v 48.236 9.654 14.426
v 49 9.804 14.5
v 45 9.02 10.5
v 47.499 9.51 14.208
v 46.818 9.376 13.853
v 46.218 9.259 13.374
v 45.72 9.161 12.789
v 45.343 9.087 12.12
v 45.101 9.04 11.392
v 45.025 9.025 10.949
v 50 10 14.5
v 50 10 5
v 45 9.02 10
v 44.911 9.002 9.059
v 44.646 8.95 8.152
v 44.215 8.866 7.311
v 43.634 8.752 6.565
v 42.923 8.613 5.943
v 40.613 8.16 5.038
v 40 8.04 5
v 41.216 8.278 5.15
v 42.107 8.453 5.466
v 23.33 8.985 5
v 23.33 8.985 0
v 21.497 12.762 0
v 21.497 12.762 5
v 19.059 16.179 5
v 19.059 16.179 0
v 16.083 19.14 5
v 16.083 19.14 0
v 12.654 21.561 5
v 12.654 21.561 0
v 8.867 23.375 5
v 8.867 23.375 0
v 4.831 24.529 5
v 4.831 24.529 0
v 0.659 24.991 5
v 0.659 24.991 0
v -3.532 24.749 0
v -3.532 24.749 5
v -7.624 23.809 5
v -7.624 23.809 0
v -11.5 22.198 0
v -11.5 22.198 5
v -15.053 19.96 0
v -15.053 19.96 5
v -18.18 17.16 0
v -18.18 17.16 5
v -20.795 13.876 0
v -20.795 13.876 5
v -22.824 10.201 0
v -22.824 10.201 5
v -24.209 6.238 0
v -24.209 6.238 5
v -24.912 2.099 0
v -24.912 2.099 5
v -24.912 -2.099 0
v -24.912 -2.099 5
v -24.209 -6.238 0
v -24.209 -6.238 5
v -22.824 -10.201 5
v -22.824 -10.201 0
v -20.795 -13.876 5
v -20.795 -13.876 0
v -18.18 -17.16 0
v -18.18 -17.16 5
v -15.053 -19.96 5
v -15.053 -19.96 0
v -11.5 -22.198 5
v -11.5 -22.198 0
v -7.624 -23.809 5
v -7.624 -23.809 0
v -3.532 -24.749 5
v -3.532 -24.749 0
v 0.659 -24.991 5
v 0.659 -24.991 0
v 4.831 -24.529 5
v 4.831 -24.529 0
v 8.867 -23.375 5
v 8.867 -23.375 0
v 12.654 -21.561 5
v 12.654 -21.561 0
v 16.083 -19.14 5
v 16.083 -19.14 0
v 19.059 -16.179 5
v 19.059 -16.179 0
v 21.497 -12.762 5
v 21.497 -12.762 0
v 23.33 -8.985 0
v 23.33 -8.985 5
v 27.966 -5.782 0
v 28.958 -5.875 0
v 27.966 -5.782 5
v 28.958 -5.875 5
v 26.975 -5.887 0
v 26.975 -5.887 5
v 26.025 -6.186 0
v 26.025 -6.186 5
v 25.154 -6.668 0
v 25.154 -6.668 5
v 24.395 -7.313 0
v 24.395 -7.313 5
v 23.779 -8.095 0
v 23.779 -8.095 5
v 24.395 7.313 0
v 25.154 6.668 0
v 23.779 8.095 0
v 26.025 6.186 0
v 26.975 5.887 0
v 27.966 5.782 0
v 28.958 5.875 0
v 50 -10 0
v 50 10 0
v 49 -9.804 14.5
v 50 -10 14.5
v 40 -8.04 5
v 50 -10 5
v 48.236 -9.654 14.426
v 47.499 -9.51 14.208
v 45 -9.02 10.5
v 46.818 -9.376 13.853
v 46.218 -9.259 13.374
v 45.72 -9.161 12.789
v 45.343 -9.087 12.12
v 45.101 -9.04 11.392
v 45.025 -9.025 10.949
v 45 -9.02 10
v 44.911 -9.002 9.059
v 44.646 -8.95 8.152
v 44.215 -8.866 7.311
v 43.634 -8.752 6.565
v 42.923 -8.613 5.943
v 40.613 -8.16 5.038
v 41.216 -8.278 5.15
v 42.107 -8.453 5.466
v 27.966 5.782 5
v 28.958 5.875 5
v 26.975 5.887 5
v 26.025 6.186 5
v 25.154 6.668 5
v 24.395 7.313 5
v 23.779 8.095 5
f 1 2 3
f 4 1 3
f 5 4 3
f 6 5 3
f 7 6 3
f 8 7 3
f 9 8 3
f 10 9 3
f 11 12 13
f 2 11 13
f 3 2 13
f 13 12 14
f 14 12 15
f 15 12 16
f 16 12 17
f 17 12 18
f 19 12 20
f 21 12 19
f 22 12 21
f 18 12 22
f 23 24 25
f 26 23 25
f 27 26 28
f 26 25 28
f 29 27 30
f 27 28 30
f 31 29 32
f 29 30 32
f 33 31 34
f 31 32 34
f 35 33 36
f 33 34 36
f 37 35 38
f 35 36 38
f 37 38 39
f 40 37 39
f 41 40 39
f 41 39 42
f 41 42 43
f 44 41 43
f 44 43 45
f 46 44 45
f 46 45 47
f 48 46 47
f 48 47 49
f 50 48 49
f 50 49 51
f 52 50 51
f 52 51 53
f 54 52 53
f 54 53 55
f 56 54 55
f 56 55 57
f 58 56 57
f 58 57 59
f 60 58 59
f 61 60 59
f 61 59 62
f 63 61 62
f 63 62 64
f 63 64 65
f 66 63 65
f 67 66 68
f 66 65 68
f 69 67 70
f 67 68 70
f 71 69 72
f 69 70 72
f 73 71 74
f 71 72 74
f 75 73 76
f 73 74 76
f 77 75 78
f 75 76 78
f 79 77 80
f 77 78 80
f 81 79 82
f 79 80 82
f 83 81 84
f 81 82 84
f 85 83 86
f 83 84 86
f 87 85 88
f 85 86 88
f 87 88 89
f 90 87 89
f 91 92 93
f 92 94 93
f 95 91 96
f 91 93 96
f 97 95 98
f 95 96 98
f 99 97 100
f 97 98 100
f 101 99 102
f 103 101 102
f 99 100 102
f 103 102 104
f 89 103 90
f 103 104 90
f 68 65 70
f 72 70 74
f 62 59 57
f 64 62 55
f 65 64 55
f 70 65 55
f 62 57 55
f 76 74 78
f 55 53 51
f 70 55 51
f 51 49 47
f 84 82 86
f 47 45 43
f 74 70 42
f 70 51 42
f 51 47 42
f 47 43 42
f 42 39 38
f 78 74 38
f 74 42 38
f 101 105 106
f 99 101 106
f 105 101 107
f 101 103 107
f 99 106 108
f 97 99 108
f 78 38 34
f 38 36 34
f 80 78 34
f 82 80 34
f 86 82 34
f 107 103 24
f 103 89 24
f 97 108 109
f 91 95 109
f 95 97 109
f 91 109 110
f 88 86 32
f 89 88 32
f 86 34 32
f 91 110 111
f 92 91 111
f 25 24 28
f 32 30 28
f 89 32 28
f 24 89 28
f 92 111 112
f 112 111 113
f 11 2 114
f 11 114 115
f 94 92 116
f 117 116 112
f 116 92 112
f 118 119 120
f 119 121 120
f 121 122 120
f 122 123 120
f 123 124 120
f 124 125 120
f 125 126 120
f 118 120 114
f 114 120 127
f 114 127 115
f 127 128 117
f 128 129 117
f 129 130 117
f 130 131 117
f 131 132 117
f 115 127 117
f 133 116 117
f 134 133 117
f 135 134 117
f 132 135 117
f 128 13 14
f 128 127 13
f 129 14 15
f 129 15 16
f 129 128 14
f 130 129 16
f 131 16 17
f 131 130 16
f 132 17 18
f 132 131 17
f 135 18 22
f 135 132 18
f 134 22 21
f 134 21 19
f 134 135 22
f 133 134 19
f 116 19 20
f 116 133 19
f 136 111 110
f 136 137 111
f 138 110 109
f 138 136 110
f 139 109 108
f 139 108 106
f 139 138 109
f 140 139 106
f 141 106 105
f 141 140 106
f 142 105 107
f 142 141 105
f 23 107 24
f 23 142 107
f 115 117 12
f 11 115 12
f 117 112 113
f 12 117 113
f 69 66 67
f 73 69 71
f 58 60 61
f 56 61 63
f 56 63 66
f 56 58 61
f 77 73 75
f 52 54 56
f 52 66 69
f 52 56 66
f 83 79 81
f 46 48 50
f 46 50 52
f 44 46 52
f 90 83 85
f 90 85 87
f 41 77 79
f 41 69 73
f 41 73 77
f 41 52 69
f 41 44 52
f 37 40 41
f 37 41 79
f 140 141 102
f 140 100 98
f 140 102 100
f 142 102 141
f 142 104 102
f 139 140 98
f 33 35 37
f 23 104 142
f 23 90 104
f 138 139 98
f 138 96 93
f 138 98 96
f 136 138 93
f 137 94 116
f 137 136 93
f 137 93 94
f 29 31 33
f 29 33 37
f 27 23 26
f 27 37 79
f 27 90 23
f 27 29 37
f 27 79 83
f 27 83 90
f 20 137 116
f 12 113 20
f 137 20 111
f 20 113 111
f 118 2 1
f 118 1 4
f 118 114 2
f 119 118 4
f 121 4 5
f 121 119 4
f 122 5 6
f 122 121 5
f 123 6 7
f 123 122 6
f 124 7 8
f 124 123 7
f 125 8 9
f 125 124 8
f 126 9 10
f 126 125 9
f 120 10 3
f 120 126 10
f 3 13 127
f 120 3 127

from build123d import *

# Parameters (mm, degrees)
F1_DEPTH = 5
F3_DEPTH = 9.5
F4_R     = 5
F5_R     = 4


# Not quite as in the source:
# - a feature names something its author has since deleted; it is built from what else it names


with BuildPart() as f1:
    # F0 (on Top) → F1 (new body)
    with BuildSketch(Plane.XY):
        with BuildLine():
            Line((50, 10), (24.4948974278, 5))
            ThreePointArc((24.4948974278, 5), (-25, 0), (24.4948974278, -5))
            Line((24.4948974278, -5), (50, -10))
            Line((50, -10), (50, 10))
        make_face()
    extrude(amount=F1_DEPTH)

    # F2 (on face) → F3 (join)
    with BuildSketch(Plane.XY.offset(5)):
        Polygon((50, -10), (50, 10), (45, 9.0198039812), (45, -9.0198039812), align=None)
    extrude(amount=F3_DEPTH)

    # F4
    f4_edges = [f1.edges().sort_by_distance(p)[0] for p in [
        (45, 0, 5),
        (24.494897, -5, 2.5),
        (24.494897, 5, 2.5),
    ]]
    fillet(f4_edges, radius=F4_R)

    # F5
    f5_edges = [f1.edges().sort_by_distance(p)[0] for p in [
        (45, 0, 14.5),
    ]]
    fillet(f5_edges, radius=F5_R)


solid = f1.part
